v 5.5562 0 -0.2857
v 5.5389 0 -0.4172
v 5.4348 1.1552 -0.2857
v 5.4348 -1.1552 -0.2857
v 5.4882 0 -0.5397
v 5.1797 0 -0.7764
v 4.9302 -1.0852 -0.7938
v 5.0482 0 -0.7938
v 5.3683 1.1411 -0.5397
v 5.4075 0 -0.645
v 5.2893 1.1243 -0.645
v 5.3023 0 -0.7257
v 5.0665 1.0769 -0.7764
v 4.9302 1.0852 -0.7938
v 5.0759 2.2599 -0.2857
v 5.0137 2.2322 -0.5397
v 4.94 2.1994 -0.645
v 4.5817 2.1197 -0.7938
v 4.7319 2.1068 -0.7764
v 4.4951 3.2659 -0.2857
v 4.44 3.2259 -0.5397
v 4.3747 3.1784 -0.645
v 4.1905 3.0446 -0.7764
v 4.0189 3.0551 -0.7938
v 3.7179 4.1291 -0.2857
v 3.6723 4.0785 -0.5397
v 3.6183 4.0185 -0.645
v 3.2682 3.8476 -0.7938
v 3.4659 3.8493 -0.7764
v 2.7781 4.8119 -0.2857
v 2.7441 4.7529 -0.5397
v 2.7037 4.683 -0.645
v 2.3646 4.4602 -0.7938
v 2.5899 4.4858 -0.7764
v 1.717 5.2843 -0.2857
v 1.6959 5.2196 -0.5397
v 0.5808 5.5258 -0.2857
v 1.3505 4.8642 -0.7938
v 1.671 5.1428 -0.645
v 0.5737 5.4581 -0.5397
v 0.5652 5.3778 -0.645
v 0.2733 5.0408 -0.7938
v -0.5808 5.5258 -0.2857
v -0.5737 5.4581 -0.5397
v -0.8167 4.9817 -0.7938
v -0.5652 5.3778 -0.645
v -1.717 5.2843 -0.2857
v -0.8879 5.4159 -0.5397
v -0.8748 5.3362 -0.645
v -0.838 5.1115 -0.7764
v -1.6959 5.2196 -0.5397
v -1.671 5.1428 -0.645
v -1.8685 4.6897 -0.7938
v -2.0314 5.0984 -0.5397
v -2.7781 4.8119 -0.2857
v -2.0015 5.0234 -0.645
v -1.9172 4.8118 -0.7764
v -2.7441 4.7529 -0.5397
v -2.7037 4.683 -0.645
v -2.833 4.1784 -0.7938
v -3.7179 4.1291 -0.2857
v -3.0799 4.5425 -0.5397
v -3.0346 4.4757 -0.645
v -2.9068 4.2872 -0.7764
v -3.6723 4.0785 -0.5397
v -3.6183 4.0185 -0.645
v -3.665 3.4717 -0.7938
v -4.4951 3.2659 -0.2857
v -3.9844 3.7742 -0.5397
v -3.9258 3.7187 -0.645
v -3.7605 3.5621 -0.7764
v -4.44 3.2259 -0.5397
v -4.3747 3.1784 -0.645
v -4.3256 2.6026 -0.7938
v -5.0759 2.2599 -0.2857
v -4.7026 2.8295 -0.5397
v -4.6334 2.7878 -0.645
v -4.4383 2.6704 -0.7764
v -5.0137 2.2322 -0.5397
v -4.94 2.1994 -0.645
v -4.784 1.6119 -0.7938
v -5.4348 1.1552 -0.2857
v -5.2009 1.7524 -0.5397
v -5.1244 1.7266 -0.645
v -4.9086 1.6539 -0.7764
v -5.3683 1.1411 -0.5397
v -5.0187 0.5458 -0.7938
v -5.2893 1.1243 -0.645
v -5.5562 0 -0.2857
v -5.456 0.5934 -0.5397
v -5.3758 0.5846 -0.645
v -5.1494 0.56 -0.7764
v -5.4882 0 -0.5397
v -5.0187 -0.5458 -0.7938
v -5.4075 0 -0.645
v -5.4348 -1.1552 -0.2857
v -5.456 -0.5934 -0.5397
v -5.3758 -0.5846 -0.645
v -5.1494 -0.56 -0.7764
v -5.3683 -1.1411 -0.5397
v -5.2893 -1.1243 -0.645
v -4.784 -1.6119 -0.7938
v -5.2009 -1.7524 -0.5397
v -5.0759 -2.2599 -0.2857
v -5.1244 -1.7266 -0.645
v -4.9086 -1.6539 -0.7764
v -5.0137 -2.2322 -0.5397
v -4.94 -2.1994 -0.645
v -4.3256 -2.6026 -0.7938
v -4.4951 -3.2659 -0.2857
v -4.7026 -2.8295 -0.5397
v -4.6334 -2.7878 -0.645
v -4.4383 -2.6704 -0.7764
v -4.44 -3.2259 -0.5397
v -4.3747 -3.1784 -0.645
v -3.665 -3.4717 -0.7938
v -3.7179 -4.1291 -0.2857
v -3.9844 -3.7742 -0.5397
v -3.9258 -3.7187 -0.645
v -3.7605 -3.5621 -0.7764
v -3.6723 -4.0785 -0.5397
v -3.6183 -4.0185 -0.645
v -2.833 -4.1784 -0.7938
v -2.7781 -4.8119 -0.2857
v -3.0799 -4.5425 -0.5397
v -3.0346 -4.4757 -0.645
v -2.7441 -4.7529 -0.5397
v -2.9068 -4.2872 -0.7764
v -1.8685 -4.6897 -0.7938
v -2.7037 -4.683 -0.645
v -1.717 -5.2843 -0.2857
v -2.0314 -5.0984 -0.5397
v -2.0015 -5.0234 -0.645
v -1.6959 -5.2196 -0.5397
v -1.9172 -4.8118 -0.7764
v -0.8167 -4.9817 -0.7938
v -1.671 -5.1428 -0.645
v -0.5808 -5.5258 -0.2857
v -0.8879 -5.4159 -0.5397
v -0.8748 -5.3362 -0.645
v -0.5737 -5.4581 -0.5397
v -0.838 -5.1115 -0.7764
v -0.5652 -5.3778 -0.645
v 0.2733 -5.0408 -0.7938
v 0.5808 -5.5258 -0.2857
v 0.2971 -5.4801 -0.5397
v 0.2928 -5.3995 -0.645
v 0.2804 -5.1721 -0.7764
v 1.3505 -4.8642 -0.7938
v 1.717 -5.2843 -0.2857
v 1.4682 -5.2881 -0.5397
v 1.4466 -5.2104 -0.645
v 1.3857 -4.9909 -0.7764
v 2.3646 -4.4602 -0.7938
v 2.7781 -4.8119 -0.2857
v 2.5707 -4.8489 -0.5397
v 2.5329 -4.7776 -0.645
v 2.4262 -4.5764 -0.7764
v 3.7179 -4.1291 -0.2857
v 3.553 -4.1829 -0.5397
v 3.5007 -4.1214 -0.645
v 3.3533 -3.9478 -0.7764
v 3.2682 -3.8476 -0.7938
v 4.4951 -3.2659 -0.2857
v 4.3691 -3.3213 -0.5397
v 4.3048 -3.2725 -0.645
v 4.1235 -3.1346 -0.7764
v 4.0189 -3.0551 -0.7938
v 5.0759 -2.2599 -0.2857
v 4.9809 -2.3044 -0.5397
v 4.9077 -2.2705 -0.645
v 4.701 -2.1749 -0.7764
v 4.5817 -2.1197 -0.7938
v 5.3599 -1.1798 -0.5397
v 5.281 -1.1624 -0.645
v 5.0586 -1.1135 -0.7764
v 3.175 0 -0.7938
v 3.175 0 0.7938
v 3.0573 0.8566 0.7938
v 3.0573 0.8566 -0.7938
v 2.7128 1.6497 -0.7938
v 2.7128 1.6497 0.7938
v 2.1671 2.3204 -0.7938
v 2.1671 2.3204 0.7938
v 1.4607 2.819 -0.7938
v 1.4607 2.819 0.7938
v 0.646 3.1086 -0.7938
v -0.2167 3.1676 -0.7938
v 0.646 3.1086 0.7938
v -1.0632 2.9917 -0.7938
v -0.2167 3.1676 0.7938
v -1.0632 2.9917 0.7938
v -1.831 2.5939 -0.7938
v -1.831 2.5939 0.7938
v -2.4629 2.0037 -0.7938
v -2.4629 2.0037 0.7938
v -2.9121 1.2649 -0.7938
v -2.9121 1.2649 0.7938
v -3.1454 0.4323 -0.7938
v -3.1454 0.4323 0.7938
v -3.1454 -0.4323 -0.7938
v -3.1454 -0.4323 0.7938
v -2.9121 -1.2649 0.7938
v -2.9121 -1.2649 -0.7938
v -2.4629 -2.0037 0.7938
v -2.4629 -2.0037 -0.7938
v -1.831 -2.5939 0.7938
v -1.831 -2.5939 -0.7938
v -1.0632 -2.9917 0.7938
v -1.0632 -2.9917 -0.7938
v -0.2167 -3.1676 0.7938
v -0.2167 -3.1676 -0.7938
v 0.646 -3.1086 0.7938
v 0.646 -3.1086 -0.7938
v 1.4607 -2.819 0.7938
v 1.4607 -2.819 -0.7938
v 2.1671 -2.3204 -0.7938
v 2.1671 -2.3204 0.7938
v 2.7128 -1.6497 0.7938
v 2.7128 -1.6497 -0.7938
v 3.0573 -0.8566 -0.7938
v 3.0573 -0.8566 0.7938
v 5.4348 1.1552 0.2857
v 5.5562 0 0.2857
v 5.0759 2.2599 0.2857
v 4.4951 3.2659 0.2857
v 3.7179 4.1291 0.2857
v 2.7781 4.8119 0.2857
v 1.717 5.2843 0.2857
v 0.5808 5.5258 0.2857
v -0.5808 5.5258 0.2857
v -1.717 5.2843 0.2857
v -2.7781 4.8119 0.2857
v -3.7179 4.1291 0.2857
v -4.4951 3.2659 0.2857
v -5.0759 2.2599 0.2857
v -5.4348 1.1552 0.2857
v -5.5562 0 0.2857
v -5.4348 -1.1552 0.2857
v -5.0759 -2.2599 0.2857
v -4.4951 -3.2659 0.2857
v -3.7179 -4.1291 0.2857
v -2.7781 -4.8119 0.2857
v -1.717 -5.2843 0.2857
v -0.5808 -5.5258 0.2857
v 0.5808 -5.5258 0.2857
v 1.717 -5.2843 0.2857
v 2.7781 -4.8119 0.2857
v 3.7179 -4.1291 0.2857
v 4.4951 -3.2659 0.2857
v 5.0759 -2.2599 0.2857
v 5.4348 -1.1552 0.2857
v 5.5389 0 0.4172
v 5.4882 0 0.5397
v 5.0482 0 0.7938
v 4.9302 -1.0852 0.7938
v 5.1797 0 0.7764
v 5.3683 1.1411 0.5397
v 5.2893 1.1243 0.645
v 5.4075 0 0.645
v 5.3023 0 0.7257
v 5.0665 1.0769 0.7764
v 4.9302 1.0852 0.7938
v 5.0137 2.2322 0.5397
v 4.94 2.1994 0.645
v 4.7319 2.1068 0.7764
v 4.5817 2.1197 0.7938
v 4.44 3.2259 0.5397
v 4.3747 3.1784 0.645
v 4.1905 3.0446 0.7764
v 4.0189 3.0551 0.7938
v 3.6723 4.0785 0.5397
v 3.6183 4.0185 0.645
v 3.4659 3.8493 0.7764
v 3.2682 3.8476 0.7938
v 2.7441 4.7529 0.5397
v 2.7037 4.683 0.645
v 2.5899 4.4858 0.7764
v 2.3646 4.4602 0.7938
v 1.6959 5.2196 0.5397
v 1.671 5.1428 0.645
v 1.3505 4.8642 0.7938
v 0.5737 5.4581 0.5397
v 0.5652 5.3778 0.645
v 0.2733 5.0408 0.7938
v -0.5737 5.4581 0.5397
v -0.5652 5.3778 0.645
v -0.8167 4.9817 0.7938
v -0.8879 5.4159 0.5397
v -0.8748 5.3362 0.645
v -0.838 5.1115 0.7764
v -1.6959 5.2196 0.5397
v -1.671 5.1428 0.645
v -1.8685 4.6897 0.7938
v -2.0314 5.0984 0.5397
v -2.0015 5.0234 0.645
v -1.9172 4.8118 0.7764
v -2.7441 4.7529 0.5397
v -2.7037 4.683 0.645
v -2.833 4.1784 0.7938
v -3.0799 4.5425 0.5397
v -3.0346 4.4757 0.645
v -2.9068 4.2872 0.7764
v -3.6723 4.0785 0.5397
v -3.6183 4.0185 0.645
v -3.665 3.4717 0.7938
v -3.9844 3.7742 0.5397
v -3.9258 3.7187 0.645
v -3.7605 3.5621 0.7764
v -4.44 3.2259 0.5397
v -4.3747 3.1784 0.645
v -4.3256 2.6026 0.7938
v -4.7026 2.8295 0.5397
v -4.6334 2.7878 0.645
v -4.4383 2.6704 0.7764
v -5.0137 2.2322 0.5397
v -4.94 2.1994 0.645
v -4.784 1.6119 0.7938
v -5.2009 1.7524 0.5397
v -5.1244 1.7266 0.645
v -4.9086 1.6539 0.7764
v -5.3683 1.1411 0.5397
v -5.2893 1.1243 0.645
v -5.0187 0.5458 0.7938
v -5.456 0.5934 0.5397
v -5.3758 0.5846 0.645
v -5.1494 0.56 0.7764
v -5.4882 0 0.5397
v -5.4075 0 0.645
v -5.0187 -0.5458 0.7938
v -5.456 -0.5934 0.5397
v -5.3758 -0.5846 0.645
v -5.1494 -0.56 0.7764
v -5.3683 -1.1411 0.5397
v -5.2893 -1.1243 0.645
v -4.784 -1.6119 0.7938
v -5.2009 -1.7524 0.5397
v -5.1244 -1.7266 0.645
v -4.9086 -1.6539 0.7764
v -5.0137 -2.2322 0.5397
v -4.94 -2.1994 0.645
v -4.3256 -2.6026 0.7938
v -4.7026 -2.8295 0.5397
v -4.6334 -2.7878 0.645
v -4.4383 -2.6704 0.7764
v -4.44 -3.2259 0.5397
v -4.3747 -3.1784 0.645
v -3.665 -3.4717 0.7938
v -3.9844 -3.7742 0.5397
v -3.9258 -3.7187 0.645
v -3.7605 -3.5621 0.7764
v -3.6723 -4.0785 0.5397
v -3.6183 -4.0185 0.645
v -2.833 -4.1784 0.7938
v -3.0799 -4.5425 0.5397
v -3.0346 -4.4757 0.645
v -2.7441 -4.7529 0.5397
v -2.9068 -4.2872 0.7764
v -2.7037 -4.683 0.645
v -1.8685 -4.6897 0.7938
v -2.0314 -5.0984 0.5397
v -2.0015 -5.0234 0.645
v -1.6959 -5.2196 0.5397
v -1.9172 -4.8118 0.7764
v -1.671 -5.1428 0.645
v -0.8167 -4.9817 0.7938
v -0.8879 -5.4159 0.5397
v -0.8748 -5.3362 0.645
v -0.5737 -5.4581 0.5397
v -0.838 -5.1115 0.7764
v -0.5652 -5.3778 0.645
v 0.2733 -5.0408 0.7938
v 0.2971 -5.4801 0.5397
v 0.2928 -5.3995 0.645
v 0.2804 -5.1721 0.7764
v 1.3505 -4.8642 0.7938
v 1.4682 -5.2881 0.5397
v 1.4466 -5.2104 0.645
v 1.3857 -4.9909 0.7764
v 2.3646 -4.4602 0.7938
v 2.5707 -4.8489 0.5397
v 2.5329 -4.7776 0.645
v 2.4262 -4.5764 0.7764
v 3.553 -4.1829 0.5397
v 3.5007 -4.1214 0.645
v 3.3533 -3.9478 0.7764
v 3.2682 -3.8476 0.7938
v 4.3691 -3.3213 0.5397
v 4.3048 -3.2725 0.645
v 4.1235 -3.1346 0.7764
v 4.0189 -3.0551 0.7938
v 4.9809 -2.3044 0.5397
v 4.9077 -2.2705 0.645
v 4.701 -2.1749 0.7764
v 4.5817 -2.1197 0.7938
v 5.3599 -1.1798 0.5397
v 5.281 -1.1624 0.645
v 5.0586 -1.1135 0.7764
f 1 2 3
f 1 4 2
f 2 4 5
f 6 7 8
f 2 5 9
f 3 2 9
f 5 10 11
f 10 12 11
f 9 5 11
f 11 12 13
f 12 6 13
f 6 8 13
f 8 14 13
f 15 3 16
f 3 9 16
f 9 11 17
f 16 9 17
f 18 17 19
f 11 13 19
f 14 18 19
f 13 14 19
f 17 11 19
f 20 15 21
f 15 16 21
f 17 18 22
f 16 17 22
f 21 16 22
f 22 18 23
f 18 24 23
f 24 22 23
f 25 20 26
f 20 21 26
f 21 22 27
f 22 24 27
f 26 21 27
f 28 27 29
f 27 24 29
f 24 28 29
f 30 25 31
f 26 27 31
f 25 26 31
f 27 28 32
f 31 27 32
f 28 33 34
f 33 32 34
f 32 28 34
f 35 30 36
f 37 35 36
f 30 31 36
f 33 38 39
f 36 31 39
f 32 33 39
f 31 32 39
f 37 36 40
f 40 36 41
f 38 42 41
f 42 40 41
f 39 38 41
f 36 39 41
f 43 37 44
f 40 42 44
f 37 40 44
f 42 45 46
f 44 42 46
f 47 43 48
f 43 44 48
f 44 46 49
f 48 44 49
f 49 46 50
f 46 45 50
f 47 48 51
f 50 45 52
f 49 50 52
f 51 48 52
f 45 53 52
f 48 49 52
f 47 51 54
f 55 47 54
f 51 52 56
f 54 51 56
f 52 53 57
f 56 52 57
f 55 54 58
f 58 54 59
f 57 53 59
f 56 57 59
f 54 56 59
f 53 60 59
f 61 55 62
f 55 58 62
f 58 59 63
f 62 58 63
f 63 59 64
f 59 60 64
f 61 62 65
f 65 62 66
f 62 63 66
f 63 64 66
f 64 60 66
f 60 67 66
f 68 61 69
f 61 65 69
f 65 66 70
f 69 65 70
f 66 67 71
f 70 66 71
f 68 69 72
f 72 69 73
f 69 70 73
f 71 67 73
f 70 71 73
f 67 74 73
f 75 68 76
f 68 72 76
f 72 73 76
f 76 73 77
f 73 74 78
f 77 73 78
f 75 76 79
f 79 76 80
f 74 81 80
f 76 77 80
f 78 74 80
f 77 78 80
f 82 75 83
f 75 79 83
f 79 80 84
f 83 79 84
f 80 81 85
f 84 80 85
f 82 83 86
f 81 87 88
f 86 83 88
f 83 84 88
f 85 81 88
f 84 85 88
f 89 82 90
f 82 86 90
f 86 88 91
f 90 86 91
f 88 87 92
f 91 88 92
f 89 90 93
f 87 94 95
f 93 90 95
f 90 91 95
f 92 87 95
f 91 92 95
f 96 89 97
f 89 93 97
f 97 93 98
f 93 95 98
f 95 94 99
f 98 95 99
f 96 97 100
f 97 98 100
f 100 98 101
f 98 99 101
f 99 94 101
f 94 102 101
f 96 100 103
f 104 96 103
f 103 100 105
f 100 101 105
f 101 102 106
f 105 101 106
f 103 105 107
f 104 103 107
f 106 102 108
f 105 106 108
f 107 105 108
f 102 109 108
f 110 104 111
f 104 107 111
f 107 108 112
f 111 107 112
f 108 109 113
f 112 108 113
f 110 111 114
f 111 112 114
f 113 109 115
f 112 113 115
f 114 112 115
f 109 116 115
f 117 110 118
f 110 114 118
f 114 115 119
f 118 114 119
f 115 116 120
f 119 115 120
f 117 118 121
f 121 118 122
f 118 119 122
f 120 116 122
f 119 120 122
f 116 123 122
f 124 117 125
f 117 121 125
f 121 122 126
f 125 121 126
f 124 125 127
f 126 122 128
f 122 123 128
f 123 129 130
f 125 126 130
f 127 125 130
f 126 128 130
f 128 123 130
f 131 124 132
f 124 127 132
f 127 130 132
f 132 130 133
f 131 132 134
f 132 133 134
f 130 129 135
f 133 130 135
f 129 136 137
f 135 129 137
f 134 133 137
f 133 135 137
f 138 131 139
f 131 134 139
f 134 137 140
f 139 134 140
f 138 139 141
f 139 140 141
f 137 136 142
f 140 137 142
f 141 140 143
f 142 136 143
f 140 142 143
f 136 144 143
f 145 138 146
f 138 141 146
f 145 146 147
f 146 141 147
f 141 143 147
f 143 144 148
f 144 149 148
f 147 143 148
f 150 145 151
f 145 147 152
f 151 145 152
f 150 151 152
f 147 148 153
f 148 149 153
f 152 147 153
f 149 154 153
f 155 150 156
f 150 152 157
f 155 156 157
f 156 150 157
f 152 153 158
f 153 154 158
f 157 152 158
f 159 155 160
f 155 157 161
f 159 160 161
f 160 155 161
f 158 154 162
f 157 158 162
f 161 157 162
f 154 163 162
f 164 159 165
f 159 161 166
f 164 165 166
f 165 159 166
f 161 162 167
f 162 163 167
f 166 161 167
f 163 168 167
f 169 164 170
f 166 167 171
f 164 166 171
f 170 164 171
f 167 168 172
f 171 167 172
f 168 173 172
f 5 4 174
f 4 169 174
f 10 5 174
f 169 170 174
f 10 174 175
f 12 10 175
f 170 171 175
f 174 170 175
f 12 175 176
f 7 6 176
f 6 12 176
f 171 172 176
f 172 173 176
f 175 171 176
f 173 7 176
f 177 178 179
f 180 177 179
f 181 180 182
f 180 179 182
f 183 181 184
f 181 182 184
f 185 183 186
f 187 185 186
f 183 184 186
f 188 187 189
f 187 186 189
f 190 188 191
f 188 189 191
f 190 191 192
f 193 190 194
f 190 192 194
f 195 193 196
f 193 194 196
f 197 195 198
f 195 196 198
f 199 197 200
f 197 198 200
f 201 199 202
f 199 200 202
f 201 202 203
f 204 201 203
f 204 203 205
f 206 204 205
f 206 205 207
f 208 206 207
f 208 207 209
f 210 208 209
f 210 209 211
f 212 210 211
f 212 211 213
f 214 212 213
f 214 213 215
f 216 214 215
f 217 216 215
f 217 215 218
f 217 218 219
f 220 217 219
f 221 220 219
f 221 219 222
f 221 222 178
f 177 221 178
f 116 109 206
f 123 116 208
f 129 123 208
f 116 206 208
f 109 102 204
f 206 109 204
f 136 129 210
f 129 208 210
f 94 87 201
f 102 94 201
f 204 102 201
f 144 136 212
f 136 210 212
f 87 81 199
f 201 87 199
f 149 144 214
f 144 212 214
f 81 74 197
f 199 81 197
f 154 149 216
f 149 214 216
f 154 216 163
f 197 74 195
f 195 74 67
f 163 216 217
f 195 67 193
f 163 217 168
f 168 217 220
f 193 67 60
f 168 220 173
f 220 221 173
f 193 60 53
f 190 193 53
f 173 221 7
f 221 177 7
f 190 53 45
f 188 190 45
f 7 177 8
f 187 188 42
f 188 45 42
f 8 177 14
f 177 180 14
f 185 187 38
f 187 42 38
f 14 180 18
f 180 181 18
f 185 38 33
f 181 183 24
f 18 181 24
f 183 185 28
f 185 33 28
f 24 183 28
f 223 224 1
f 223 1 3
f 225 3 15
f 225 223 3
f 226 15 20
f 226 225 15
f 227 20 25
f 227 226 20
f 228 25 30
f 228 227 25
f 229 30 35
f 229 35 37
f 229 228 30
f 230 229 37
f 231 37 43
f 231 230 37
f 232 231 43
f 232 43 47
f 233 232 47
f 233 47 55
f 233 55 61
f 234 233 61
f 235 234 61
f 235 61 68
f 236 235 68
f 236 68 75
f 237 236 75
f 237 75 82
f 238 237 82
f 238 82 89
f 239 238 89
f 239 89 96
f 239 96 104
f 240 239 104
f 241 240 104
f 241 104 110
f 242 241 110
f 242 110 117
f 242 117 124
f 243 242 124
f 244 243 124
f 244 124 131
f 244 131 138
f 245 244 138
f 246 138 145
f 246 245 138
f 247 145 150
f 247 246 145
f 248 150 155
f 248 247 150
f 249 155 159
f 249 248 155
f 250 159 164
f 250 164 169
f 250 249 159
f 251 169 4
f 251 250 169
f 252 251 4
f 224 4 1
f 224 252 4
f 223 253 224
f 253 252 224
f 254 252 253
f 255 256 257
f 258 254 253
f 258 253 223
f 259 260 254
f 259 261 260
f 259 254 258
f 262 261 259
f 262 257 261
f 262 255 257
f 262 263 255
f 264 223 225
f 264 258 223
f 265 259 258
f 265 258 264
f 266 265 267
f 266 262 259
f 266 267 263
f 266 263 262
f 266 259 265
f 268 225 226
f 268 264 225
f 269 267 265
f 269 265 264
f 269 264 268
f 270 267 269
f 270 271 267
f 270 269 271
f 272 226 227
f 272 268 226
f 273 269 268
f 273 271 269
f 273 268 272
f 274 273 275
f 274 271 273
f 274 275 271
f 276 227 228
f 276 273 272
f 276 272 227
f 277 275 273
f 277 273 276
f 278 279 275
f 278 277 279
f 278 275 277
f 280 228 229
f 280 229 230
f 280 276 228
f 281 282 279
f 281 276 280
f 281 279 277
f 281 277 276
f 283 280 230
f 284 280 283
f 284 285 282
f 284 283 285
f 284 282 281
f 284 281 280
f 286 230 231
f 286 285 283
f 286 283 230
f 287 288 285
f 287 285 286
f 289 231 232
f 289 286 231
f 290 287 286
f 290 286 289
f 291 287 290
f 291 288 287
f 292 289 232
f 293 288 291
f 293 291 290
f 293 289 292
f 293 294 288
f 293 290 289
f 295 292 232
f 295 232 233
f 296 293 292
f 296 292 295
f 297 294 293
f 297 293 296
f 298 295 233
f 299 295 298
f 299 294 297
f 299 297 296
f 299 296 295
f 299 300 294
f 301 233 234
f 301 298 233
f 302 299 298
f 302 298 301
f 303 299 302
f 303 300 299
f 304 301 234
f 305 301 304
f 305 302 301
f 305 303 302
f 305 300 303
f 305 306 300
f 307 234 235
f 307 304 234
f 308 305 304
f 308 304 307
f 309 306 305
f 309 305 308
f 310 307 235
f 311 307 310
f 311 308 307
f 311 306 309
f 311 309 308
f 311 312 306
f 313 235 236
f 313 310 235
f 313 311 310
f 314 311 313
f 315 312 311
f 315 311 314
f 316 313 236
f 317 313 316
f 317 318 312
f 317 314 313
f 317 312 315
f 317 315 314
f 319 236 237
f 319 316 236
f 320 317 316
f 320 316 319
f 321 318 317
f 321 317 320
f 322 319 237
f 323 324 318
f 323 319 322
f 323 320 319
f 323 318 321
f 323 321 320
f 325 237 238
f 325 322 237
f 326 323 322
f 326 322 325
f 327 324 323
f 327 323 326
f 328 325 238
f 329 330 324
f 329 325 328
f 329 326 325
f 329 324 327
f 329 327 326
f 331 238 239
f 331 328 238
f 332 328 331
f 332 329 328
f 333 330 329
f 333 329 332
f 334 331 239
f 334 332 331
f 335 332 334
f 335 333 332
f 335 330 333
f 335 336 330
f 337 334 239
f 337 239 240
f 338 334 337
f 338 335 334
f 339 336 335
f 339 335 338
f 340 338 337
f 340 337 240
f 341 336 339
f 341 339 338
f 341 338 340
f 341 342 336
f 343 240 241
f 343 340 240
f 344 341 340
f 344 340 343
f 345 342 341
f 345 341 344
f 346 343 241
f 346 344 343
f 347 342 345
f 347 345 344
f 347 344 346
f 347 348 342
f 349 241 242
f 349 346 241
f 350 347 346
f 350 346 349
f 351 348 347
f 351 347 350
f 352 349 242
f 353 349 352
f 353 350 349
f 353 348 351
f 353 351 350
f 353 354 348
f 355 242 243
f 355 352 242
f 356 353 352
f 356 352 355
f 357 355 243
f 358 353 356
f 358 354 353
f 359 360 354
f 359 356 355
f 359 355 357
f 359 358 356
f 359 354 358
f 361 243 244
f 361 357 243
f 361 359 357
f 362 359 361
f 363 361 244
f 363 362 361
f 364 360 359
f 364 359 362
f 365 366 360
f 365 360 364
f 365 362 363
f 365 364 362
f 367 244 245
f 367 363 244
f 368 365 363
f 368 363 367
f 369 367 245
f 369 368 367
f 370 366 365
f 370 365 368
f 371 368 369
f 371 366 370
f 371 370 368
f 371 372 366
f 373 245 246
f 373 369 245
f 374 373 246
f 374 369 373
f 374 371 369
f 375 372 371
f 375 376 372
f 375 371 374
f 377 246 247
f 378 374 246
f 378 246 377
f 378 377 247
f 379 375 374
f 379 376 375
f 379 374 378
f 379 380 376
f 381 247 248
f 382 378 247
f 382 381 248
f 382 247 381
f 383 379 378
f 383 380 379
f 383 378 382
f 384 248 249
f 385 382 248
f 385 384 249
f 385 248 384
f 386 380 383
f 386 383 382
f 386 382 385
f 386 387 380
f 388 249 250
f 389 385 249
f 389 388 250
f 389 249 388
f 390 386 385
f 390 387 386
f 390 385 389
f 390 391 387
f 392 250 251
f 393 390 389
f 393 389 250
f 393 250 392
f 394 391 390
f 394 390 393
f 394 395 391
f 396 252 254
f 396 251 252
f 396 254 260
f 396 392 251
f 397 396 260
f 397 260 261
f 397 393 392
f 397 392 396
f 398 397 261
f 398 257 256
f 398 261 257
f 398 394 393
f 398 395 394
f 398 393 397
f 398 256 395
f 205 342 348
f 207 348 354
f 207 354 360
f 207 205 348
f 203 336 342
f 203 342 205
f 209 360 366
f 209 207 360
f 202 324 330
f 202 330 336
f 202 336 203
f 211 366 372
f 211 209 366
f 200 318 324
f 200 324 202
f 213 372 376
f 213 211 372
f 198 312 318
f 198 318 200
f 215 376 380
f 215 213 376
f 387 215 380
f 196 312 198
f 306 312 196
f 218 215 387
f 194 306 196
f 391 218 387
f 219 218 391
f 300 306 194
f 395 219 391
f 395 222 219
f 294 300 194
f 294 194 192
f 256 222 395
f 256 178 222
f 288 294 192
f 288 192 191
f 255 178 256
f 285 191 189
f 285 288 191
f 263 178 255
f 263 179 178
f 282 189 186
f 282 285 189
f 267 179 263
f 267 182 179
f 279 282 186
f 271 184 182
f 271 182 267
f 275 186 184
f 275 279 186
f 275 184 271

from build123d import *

# Parameters (mm, degrees)
F0_R     = 5.55625
F1_DEPTH = 0.79375
F2_R     = 3.175
F3_DEPTH = 1.5885
F4_R     = 0.508


with BuildPart() as f1:
    # F0 (on Top) → F1 (new body, symmetric)
    with BuildSketch(Plane.XY):
        Circle(F0_R)
    extrude(amount=F1_DEPTH, both=True)

    # F2 (on face) → F3 (cut, through all)
    with BuildSketch(Plane.XY.offset(0.79375)):
        Circle(F2_R)
    extrude(amount=-F3_DEPTH, mode=Mode.SUBTRACT)

    # F4
    f4_edges = [f1.edges().sort_by_distance(p)[0] for p in [
        (-5.55625, 0, 0.79375),
        (-5.55625, 0, -0.79375),
    ]]
    fillet(f4_edges, radius=F4_R)


solid = f1.part
